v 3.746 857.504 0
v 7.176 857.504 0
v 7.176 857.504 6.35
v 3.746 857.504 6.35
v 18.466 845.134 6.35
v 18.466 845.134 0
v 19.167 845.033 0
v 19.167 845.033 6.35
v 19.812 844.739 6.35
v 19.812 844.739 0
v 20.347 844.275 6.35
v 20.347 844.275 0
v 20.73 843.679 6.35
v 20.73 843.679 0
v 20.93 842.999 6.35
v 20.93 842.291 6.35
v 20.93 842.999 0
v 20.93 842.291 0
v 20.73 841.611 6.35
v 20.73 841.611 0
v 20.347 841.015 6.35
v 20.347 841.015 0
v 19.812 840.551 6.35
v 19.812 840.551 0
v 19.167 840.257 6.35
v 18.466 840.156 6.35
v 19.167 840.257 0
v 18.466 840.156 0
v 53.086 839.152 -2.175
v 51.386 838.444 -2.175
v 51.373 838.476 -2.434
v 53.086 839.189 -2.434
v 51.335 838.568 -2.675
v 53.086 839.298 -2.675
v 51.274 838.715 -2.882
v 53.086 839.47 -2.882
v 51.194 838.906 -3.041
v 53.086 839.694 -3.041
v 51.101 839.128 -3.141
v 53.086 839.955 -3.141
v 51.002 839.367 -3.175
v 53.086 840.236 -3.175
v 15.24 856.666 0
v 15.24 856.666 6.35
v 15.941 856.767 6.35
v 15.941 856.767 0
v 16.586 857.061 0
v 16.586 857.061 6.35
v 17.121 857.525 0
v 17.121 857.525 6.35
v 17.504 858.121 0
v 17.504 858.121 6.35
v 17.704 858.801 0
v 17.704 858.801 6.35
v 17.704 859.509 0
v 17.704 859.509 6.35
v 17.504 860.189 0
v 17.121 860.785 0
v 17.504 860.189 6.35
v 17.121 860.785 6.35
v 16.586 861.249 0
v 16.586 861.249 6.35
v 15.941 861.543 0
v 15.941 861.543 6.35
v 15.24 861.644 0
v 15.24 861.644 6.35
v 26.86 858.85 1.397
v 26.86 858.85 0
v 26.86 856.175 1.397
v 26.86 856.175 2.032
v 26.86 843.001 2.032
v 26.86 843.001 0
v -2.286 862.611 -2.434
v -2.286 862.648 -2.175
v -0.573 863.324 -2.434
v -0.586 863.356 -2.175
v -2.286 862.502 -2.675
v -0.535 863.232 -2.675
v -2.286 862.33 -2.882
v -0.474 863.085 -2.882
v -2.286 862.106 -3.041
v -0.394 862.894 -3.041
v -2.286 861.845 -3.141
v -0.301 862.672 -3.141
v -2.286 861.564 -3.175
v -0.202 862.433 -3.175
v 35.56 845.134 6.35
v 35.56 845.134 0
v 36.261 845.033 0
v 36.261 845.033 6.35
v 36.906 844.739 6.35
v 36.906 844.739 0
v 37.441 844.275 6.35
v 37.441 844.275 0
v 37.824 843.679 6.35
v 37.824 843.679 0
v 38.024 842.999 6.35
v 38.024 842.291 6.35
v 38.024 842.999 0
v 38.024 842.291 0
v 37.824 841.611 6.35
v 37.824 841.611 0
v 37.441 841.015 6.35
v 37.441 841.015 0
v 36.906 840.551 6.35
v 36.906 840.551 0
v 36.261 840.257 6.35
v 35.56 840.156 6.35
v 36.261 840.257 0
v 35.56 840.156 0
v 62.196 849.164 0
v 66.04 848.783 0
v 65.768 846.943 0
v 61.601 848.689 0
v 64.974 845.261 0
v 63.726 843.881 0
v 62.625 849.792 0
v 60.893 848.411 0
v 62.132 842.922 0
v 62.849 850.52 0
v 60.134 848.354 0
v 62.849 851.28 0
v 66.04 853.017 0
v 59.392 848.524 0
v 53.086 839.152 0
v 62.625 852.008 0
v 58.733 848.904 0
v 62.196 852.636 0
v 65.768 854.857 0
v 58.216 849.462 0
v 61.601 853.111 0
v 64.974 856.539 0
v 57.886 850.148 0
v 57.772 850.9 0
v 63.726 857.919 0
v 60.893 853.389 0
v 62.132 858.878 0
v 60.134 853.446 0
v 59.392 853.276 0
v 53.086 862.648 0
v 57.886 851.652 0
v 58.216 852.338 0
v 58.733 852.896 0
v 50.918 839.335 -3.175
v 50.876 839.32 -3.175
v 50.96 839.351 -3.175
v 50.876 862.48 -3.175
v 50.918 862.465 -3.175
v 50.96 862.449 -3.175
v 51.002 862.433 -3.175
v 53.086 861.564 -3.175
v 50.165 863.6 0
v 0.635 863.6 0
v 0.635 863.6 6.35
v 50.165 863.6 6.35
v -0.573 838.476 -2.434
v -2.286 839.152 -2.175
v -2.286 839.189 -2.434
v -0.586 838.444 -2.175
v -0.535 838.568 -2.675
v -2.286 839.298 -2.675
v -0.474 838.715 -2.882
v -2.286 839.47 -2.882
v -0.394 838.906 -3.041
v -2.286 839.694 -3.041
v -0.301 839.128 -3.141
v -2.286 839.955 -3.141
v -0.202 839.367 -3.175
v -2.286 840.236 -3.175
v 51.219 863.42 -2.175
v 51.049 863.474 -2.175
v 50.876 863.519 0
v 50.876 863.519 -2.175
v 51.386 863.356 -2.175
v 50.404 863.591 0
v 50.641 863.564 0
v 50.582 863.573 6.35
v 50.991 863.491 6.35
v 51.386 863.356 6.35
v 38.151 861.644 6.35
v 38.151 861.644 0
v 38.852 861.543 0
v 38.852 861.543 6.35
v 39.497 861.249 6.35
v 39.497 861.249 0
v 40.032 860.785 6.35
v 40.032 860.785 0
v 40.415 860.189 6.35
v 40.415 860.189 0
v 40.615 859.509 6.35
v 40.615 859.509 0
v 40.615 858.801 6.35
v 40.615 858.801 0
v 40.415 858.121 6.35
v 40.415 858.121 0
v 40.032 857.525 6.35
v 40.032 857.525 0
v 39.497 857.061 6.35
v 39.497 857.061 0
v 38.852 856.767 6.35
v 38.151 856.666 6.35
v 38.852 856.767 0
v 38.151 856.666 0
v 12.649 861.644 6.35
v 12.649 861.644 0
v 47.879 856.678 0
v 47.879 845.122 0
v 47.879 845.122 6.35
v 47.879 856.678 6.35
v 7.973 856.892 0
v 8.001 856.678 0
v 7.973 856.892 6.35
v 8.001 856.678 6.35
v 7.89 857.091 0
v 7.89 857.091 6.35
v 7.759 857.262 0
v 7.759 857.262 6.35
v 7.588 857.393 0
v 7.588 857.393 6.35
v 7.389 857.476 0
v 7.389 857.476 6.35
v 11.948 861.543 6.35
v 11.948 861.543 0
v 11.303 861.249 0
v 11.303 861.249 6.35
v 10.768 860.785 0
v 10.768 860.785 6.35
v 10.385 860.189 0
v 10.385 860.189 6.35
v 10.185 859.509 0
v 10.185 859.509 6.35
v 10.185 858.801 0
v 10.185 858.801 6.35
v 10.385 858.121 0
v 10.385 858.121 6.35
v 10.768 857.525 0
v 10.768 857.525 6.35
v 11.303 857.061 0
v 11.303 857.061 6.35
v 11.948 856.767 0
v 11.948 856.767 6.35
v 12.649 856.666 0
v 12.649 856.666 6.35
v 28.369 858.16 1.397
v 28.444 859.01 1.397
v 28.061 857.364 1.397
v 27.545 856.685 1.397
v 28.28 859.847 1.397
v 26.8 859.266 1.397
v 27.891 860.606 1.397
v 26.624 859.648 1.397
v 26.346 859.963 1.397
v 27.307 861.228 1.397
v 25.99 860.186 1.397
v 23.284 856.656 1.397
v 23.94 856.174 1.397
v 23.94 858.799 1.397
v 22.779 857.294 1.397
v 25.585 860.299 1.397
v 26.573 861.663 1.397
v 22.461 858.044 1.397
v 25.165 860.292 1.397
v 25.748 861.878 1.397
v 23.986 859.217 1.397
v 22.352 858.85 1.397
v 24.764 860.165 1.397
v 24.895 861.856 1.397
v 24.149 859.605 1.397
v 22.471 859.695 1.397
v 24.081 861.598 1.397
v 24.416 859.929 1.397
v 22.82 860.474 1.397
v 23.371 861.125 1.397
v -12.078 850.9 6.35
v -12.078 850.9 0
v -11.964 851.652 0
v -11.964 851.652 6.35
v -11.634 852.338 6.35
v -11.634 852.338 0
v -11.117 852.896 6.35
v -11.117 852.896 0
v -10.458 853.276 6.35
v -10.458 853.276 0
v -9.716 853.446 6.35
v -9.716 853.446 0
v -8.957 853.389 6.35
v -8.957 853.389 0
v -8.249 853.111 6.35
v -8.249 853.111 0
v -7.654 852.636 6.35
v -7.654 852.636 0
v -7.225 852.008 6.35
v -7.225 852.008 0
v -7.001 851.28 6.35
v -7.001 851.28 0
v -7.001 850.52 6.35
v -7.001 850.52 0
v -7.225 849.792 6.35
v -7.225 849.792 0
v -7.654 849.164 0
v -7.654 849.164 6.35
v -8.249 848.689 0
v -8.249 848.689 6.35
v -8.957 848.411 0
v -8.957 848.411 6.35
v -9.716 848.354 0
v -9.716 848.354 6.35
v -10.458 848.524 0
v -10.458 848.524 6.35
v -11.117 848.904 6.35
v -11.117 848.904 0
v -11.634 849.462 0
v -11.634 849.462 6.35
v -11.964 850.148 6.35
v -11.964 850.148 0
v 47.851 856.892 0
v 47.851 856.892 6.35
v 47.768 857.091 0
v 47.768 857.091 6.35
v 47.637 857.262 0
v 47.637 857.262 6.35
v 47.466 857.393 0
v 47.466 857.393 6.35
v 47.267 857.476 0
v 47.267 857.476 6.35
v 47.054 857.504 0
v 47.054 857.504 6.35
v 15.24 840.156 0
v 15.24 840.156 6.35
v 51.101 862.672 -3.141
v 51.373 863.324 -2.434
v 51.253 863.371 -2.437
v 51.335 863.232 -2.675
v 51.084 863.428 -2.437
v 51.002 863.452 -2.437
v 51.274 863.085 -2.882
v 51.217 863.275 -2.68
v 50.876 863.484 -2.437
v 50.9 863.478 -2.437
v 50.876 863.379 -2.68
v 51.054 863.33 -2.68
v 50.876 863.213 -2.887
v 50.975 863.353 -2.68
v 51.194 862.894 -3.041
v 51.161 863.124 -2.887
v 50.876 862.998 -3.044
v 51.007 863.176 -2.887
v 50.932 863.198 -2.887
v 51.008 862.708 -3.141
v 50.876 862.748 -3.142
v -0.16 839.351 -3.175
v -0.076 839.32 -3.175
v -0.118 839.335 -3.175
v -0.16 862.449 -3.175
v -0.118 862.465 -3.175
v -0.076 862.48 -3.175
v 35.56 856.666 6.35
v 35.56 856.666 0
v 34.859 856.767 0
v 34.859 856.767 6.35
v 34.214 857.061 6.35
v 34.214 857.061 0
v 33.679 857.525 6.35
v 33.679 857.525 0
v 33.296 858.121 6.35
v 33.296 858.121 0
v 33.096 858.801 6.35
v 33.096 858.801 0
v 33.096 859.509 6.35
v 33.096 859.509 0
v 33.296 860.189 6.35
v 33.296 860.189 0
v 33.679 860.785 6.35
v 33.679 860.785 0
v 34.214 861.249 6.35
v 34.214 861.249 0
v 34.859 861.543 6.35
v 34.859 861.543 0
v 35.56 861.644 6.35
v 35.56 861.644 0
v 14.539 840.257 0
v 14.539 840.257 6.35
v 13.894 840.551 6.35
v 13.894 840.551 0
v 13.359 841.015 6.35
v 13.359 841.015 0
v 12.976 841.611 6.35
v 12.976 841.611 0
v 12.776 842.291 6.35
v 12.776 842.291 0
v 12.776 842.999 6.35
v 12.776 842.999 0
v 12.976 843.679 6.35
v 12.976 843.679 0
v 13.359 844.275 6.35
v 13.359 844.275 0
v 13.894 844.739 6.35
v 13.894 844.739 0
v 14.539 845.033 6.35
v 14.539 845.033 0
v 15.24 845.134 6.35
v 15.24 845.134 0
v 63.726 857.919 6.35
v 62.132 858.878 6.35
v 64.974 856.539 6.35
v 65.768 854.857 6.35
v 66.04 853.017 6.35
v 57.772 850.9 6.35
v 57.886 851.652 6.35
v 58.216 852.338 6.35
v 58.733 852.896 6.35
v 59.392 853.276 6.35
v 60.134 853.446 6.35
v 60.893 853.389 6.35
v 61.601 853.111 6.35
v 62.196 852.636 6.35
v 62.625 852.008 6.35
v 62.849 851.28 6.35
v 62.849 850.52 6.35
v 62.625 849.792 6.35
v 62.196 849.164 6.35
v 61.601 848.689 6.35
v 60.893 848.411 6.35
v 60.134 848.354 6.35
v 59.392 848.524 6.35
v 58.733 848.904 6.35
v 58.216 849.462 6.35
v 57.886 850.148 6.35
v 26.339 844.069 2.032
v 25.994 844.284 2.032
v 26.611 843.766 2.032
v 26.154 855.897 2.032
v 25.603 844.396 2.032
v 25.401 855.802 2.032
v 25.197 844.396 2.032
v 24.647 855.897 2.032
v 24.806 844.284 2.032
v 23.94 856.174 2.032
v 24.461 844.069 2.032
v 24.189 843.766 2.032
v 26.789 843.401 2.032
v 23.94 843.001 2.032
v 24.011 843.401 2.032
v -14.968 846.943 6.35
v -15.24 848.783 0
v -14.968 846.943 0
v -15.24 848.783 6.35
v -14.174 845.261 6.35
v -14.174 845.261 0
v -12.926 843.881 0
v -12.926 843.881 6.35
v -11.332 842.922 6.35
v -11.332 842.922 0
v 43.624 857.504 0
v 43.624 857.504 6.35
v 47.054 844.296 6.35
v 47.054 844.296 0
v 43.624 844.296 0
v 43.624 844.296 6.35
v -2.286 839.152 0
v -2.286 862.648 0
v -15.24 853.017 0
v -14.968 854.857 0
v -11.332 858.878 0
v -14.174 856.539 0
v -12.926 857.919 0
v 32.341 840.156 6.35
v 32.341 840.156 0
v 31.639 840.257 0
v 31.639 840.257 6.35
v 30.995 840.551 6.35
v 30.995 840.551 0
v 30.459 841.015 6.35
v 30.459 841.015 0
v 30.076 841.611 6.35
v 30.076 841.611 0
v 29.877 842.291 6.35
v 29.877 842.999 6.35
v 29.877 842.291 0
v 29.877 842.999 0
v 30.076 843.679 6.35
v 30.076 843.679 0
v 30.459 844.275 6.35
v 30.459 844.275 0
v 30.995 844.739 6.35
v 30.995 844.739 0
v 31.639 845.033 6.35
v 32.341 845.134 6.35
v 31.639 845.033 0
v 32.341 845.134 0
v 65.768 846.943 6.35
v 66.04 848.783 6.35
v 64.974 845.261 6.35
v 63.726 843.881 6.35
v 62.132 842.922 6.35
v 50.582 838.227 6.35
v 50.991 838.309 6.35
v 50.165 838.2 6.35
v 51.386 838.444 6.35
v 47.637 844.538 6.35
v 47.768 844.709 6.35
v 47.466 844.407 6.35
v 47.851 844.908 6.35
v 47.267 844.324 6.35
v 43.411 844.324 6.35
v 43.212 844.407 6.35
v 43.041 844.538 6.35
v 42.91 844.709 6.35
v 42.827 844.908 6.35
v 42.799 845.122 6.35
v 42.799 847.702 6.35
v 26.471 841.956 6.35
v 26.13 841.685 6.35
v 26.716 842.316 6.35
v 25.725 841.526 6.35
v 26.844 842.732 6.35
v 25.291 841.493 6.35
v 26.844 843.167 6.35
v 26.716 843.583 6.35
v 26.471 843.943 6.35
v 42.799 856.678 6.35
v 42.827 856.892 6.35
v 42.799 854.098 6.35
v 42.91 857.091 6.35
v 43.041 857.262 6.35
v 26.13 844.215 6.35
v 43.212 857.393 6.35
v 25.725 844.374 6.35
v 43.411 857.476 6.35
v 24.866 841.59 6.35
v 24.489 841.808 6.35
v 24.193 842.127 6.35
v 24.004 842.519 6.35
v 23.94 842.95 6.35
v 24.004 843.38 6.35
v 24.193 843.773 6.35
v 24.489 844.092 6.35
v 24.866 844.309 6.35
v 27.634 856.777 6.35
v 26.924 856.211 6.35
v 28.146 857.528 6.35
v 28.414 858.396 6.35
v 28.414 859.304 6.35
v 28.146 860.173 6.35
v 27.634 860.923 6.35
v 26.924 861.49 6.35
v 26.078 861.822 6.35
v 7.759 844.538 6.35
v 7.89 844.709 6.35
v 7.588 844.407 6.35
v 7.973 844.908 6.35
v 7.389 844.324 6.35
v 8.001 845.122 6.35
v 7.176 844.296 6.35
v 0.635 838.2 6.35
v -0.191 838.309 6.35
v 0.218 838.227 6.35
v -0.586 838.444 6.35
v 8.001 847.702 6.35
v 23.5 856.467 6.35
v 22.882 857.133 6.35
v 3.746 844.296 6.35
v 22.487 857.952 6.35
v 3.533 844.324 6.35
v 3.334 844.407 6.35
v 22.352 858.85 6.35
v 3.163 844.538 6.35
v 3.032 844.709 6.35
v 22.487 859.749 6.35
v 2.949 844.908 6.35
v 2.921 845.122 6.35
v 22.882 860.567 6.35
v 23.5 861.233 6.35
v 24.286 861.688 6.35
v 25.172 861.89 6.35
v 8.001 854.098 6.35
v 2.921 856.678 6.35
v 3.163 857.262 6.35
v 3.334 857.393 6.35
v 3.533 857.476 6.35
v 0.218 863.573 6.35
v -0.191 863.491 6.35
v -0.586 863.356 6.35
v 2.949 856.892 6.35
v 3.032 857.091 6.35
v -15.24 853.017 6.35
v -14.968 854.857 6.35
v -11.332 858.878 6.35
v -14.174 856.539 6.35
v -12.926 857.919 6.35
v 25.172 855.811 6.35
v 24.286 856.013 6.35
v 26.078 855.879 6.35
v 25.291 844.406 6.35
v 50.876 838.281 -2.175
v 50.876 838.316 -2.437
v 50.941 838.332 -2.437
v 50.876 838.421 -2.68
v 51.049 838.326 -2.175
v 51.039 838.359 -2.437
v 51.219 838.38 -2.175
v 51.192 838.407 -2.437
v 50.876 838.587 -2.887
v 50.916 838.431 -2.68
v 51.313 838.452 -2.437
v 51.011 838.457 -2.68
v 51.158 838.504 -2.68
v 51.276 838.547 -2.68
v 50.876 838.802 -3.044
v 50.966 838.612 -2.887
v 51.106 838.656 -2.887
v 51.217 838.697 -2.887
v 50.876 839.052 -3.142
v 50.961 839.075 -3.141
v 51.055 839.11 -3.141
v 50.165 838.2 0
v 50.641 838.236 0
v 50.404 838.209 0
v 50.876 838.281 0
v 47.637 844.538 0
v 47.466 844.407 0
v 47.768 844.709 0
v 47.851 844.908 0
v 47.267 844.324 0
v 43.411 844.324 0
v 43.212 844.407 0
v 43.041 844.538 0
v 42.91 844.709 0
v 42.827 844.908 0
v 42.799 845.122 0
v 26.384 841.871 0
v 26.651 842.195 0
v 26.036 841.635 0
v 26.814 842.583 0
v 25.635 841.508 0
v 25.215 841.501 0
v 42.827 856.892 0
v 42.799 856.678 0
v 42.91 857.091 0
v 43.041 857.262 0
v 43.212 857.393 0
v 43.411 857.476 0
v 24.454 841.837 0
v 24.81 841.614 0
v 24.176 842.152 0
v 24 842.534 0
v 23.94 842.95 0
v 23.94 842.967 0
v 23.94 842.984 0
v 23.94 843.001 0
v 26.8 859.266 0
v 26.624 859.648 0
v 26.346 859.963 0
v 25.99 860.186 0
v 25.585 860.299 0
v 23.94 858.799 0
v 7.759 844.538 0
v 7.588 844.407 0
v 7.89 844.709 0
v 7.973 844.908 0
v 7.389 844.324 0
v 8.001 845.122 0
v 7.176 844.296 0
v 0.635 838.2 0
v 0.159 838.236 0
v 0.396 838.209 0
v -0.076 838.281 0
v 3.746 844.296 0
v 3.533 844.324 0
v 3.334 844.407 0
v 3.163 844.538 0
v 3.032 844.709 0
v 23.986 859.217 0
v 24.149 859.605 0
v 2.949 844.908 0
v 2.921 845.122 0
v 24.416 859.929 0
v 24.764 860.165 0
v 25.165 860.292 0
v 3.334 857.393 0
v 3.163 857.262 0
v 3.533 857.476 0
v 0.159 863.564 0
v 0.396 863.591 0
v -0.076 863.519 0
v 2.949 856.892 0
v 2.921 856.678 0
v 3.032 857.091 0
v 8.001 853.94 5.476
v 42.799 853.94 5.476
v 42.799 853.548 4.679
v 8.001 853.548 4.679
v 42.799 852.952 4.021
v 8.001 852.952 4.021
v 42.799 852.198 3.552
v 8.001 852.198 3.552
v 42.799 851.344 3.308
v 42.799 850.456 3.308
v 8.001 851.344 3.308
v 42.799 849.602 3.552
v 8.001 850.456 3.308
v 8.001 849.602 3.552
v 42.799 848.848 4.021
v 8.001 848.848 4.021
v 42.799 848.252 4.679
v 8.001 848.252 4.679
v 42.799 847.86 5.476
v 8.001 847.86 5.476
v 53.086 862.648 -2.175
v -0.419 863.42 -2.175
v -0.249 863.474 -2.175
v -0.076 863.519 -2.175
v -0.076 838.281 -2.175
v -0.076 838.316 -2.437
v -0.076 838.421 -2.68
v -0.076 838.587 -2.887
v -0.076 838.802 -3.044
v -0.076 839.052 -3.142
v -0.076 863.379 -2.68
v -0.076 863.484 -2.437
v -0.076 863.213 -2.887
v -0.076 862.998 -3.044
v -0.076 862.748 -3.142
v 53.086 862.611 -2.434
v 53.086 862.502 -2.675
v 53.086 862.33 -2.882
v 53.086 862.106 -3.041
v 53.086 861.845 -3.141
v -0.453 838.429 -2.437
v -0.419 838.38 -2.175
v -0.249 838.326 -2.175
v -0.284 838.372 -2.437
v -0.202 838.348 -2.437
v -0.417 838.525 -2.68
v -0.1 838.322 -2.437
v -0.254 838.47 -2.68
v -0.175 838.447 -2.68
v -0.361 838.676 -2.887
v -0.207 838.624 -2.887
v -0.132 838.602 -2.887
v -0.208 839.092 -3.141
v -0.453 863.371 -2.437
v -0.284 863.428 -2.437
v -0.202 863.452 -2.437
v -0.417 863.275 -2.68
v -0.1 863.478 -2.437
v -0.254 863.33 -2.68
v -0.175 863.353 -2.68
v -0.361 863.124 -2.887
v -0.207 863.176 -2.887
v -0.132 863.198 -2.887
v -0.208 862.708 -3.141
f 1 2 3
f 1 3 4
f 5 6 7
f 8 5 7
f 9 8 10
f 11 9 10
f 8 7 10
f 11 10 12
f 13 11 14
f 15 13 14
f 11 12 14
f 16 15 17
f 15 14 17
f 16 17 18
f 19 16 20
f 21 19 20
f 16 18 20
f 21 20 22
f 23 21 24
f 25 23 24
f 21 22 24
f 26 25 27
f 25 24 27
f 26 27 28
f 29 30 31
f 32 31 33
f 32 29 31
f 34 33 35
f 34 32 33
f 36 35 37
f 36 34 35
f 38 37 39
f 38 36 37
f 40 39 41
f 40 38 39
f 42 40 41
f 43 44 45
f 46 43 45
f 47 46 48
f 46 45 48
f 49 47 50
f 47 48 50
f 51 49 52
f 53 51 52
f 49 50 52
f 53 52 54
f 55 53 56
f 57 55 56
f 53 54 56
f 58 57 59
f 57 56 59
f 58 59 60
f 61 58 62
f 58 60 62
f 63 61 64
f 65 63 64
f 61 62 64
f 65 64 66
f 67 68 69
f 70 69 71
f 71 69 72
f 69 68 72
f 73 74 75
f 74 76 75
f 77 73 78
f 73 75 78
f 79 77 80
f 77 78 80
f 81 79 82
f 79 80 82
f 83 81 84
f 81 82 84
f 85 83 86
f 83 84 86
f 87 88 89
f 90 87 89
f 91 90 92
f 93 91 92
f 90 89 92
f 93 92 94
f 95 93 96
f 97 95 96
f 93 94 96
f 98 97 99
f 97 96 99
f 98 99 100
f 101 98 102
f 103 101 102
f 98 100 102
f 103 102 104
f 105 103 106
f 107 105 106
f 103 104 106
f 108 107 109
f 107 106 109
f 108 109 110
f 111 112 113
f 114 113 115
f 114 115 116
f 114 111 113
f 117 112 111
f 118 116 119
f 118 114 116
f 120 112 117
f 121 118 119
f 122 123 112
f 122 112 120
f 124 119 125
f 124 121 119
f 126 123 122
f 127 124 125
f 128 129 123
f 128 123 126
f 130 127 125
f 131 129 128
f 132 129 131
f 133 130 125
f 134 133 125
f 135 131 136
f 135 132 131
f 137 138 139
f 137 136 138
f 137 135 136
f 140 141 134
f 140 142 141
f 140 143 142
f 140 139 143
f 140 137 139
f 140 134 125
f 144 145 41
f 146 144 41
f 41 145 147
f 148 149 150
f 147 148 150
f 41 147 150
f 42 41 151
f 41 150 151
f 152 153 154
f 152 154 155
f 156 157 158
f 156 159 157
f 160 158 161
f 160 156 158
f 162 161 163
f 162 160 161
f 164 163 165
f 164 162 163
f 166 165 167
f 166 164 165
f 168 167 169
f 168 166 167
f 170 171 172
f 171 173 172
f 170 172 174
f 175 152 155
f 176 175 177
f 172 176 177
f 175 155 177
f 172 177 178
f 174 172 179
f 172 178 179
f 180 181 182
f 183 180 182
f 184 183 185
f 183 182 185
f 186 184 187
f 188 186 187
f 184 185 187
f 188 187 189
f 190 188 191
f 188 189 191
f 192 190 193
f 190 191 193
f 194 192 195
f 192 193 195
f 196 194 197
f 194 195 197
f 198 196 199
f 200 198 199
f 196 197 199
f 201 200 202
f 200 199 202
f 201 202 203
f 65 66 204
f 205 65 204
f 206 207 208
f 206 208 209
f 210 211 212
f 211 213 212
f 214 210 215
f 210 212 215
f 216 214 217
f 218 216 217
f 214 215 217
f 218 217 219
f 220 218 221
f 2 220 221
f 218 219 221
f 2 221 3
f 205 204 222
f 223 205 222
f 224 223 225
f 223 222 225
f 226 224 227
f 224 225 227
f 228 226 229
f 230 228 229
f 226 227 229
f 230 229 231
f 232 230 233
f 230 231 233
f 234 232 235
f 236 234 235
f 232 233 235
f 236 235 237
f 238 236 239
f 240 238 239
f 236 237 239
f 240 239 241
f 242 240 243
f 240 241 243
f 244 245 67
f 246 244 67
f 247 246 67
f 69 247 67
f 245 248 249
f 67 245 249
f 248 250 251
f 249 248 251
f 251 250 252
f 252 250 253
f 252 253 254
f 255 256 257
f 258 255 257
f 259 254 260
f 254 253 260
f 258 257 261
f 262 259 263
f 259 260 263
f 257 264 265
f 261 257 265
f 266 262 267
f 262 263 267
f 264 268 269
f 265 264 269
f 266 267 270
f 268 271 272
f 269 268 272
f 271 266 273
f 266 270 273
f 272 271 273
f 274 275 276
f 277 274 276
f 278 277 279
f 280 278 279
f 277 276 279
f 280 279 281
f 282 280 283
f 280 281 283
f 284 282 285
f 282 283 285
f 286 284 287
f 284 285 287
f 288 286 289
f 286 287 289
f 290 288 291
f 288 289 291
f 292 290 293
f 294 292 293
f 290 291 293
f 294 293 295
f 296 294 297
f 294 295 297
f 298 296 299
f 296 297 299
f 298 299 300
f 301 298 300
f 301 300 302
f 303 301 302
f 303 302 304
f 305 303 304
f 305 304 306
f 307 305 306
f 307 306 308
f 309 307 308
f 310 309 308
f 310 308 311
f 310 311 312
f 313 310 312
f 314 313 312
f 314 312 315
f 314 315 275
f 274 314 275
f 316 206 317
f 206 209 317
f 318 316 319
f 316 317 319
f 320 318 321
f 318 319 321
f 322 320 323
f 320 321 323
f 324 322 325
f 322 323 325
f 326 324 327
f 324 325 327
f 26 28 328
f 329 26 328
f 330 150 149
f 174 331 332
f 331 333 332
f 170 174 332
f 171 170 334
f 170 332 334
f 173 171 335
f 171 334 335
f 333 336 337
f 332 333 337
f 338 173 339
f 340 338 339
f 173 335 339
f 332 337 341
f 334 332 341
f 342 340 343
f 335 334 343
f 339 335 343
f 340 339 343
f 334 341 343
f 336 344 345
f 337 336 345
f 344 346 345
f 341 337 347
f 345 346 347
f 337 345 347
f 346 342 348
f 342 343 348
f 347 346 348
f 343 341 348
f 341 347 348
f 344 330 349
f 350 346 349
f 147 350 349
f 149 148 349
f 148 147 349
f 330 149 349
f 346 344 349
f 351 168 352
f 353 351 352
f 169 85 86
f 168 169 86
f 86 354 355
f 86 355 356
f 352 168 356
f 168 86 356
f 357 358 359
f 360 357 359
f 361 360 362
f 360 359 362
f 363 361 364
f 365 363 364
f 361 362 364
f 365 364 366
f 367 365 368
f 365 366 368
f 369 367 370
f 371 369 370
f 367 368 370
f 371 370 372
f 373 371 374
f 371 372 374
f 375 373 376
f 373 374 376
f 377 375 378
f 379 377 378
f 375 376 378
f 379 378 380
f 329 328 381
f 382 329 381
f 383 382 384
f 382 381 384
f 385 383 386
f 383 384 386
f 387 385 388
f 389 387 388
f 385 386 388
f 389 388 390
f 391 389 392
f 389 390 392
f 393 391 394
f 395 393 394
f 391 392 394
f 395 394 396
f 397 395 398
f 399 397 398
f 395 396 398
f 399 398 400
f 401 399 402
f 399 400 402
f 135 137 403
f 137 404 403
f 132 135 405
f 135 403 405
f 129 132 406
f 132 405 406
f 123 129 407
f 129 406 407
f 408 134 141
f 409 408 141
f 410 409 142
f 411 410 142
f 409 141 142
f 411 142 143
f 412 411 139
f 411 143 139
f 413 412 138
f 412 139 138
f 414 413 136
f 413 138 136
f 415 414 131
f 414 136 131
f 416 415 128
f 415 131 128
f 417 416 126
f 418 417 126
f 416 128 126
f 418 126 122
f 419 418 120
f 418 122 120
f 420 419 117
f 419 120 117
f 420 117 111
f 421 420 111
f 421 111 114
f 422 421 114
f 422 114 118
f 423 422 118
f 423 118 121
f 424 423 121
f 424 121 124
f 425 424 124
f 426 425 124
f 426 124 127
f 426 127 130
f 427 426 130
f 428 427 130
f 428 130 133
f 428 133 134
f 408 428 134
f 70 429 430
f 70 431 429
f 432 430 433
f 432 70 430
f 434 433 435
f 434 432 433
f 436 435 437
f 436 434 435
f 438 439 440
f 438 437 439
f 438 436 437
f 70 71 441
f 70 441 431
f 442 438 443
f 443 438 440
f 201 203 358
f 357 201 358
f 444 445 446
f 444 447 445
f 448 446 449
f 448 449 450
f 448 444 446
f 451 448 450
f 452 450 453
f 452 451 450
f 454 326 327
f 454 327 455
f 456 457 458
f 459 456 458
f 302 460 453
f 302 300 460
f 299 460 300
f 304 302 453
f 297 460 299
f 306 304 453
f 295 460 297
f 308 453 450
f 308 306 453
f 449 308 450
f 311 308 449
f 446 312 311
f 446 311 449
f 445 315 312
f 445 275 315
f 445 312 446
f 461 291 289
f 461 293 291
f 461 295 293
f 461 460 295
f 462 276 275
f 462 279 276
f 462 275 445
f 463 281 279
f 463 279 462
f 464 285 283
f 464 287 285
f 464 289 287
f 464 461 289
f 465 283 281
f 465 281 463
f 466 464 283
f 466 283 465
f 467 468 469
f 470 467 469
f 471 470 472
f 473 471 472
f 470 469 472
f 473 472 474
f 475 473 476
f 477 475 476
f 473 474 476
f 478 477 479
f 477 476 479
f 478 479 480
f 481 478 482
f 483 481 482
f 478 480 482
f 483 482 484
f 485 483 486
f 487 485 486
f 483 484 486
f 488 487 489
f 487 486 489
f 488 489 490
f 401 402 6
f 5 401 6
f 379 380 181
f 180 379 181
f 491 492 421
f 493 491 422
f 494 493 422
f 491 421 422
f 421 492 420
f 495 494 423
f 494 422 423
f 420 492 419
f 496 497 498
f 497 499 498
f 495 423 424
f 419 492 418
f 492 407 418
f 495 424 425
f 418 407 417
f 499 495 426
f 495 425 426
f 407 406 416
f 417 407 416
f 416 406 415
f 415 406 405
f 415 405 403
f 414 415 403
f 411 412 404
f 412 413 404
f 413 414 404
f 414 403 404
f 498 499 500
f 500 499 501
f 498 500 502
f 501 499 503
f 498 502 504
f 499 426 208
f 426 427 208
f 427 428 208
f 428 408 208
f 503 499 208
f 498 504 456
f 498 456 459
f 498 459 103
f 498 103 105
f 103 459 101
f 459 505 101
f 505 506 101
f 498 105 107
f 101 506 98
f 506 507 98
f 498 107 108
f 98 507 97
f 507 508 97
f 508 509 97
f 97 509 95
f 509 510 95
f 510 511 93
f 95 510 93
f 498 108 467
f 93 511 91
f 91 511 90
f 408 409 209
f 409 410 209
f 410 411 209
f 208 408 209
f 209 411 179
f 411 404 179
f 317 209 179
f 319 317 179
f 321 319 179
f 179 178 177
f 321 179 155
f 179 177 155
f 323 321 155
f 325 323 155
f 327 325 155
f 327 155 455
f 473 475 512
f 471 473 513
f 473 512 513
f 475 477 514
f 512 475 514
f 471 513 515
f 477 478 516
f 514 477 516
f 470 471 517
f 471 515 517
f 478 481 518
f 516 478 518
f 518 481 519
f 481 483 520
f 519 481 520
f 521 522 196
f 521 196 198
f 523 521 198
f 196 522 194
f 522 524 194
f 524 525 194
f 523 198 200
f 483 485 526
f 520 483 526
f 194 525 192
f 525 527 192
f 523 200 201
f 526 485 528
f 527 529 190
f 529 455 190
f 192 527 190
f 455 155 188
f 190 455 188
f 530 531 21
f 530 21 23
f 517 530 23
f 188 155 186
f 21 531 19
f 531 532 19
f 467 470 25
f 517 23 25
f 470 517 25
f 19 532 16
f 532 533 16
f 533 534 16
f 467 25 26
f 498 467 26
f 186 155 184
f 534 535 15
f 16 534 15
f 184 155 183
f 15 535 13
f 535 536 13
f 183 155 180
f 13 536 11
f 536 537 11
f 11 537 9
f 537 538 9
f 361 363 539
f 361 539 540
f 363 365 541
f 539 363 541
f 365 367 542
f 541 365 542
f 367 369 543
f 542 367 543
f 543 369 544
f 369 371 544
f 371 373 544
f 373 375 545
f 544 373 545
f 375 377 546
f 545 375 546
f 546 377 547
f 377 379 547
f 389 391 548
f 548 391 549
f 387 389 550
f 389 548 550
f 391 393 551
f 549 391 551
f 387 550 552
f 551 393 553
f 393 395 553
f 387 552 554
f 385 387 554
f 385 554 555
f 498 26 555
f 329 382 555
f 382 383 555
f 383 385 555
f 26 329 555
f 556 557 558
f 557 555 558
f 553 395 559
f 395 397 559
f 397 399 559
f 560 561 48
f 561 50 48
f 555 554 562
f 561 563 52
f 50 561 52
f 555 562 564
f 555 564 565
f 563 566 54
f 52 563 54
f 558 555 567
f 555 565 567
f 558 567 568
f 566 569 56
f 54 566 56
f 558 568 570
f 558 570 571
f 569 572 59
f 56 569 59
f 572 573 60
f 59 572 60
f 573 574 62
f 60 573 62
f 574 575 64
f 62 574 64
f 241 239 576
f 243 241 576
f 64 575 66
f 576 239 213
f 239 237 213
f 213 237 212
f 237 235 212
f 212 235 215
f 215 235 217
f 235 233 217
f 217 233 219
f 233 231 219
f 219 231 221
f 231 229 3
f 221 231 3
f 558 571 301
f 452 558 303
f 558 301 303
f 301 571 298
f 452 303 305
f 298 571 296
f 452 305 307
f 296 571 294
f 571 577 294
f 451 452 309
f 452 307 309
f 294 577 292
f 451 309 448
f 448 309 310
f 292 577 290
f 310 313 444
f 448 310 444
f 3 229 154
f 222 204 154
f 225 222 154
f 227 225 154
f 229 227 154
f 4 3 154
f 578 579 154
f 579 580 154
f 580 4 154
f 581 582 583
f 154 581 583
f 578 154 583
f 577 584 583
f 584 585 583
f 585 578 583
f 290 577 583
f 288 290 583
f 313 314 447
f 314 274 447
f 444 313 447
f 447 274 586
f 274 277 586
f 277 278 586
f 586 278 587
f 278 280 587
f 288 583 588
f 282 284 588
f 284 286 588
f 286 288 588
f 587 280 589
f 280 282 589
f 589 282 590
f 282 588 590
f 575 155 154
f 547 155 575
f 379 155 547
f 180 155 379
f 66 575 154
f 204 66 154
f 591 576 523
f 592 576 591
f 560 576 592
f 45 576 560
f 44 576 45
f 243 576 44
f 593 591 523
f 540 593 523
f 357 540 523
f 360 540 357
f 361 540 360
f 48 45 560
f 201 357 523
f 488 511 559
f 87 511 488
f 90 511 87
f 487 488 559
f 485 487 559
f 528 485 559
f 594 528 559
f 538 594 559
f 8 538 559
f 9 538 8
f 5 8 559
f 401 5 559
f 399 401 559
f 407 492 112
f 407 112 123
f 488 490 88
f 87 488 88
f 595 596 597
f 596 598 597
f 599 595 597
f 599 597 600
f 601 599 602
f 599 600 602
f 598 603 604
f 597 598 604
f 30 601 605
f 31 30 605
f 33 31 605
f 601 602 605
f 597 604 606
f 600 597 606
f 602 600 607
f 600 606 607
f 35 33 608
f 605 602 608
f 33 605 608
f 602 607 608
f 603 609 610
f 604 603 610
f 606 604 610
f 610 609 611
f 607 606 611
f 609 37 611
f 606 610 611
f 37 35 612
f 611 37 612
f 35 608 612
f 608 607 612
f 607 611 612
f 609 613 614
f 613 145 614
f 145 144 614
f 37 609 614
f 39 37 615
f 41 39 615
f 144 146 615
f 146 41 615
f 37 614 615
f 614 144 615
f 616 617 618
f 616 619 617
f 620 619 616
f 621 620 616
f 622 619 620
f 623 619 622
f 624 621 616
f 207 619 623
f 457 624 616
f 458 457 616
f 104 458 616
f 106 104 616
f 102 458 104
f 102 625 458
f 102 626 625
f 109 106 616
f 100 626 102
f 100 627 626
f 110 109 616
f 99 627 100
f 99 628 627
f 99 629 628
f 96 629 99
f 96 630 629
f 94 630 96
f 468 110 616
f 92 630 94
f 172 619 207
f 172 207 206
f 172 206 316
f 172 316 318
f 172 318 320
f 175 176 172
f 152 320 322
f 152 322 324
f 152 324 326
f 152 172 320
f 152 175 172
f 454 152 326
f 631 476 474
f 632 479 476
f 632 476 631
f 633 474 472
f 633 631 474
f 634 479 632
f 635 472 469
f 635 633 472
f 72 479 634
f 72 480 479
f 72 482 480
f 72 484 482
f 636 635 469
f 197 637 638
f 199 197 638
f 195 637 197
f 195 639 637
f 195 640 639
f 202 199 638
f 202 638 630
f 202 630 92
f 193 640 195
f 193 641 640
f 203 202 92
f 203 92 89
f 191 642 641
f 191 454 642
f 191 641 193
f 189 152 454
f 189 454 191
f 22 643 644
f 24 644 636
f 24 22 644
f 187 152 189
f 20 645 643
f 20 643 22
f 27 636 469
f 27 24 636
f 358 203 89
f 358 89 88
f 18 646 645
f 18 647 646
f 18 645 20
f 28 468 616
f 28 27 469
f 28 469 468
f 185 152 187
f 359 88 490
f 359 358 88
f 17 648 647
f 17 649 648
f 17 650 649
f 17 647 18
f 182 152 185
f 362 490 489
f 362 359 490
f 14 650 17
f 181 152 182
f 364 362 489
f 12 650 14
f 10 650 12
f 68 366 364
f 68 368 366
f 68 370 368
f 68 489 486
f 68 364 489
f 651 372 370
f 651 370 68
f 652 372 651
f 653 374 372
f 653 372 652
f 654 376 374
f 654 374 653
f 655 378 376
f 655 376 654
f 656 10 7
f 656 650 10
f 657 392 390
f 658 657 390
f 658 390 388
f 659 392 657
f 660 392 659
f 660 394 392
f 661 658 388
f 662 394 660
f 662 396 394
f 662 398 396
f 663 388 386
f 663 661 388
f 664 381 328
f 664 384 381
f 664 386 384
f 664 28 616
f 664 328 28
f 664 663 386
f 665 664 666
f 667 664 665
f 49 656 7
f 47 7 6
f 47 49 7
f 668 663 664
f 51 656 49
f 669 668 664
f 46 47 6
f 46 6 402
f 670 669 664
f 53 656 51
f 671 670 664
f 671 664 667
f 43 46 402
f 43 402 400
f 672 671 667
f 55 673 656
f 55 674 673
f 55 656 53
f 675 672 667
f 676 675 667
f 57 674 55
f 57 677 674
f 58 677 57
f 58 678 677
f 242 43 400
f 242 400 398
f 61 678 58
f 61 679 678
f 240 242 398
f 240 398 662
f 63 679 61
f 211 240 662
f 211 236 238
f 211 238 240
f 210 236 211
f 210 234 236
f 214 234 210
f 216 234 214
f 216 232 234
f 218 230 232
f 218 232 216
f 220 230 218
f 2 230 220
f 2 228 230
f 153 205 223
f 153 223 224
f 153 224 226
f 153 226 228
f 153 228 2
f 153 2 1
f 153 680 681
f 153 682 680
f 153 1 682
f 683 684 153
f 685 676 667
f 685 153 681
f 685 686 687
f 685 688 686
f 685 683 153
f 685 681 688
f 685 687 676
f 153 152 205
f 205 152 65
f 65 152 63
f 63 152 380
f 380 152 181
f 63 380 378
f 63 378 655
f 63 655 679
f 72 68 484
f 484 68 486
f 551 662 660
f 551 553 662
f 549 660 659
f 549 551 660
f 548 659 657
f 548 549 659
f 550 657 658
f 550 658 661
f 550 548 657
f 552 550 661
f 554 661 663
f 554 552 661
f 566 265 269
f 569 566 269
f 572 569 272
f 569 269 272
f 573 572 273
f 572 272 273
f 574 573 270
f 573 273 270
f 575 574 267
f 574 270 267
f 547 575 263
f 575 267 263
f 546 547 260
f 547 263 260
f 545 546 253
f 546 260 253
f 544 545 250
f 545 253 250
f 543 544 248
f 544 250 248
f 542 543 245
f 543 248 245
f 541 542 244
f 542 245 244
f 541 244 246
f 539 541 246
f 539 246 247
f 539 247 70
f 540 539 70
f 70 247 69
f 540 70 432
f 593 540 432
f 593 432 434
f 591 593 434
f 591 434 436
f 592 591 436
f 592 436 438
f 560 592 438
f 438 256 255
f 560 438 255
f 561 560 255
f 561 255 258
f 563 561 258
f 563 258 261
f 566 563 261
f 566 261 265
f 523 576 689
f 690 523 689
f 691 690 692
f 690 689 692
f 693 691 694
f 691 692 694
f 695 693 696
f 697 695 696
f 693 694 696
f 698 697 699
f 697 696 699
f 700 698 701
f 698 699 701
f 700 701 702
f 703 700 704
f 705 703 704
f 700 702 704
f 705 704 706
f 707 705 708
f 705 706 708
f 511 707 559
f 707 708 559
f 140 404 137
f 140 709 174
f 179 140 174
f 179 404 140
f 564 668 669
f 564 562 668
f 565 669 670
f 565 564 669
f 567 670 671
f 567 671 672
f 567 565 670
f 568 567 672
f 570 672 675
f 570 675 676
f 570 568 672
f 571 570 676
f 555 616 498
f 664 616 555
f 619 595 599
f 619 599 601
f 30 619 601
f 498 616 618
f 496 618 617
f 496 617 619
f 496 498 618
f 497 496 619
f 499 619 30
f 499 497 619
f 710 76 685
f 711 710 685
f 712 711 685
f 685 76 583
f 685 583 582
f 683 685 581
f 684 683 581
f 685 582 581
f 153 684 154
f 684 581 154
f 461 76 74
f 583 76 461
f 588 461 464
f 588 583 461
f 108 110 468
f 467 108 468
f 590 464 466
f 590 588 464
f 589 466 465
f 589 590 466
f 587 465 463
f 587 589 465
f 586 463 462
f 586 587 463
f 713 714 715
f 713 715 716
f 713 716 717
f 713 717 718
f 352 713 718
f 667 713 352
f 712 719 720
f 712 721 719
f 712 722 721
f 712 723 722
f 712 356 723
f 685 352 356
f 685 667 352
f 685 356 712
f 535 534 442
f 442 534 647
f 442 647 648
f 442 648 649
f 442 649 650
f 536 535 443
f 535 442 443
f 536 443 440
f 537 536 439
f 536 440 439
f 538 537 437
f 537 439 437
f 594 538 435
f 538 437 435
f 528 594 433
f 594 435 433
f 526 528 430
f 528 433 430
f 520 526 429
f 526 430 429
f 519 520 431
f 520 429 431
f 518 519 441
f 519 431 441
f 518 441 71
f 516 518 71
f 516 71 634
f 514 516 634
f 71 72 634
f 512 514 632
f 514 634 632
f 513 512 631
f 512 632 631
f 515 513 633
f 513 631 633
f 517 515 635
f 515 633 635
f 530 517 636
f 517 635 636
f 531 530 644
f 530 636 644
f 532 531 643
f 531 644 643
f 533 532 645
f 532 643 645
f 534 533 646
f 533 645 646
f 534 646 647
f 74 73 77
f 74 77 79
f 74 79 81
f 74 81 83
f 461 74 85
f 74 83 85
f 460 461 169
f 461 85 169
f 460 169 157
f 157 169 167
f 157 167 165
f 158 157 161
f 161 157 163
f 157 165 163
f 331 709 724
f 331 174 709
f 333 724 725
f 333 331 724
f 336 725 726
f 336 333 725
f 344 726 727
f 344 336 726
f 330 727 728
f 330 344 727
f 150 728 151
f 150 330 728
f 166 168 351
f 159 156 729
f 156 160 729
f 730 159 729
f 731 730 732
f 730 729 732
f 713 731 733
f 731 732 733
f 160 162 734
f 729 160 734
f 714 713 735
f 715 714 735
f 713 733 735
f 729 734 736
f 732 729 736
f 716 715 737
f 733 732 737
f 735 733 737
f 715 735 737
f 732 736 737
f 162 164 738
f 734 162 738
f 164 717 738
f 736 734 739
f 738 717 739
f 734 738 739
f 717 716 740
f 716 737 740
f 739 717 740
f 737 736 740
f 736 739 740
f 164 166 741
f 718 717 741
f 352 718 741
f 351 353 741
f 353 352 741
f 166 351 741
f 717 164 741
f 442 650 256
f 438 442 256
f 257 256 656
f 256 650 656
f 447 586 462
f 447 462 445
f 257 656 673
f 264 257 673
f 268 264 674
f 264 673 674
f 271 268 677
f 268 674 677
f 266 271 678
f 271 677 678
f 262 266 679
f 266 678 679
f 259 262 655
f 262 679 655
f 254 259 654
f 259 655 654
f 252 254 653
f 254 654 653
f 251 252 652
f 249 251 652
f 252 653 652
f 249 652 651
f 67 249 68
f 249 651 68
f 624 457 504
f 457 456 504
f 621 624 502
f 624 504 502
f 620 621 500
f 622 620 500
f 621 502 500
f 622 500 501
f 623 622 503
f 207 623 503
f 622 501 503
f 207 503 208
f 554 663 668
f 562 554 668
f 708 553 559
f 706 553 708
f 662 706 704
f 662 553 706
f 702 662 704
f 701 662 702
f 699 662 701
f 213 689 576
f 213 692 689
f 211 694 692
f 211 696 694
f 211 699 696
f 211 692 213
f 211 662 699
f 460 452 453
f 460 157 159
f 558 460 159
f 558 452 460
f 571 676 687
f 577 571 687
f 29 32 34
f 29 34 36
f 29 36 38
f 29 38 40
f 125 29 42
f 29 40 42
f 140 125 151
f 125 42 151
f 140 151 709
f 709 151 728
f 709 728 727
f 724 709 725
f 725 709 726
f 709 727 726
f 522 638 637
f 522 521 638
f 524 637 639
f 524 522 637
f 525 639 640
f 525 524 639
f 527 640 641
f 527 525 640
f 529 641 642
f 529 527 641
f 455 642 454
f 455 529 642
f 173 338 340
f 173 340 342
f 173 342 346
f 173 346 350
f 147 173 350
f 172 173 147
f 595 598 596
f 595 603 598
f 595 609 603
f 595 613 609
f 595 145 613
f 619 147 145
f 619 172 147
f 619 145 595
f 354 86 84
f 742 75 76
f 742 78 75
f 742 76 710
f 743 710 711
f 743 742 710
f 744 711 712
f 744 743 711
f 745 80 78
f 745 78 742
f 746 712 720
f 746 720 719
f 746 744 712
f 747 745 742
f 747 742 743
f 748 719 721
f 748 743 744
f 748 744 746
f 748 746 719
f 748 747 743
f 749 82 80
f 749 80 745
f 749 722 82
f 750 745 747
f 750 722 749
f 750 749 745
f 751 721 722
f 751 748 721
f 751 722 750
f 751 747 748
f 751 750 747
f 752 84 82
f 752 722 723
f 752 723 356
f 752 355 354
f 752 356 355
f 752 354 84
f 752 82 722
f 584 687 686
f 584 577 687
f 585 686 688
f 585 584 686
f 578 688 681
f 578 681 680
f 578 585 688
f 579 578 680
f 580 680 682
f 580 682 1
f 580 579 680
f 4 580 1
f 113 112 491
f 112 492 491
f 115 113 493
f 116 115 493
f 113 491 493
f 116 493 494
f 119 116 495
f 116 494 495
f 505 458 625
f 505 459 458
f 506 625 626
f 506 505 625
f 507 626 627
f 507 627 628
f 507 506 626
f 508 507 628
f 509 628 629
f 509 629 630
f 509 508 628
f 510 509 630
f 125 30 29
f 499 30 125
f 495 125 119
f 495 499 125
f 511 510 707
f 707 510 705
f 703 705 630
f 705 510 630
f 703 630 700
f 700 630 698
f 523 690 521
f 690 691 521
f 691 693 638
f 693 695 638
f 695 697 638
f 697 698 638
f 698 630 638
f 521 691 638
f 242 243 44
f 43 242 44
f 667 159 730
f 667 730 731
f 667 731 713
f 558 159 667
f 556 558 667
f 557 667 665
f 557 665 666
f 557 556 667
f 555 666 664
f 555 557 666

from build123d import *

# Parameters (mm, degrees)
BOSS_EXTRUDE1_DEPTH            = 6.35
BOSS_EXTRUDE2_DEPTH            = 3.175
BOSS_EXTRUDE3_DEPTH            = 3.175
CUT_EXTRUDE1_DEPTH             = 3.175
SKETCH5_W                      = 5.08
SKETCH5_H                      = 13.208
CUT_EXTRUDE2_DEPTH             = 7.35
SKETCH6_W                      = 5.08
SKETCH6_H                      = 13.208
CUT_EXTRUDE3_DEPTH             = 7.35
CUT_EXTRUDE4_REACH             = 60.039
CUT_EXTRUDE5_DEPTH             = 3.175
CUT_EXTRUDE6_DEPTH             = 7.35
CUT_EXTRUDE7_DEPTH             = 7.35
CUT_EXTRUDE8_DEPTH             = 7.35
CUT_EXTRUDE9_DEPTH             = 10.525
CUT_EXTRUDE10_DEPTH            = 2.032
F_12_CLEARANCE_HOLE1_D         = 6.096
F_12_CLEARANCE_HOLE1_DEPTH     = 4.953
F_3_CLEARANCE_HOLE1_D          = 2.921
F_3_CLEARANCE_HOLE1_DEPTH      = 9.525
F_7_0_201_DIAMETER_HOLE1_D     = 5.1054
F_7_0_201_DIAMETER_HOLE1_DEPTH = 9.525
FILLET1_R                      = 3.175
FILLET2_R                      = 0.8255
FILLET3_R                      = 1
FILLET4_R                      = 6.35


with BuildPart() as part:
    # Sketch1 → Boss-Extrude1 (new body)
    with BuildSketch(Plane(origin=(0, 0, 0), x_dir=(-1, 0, 0), z_dir=(0, 0, -1))):
        Polygon((-50.8, 863.6), (-66.04, 857.25), (-66.04, 844.55), (-50.8, 838.2), (0, 838.2), (15.24, 844.55), (15.24, 857.25), (0, 863.6), align=None)
    extrude(amount=-BOSS_EXTRUDE1_DEPTH)

    # Sketch2 → Boss-Extrude2 (add)
    with BuildSketch(Plane(origin=(0, 0, 0), x_dir=(-1, 0, 0), z_dir=(0, 0, -1))):
        Polygon((-50.8762, 838.23175), (-66.04, 844.55), (-66.04, 857.25), (-50.8762, 863.56825), align=None)
    extrude(amount=BOSS_EXTRUDE2_DEPTH)

    # Sketch3 → Boss-Extrude3 (add)
    with BuildSketch(Plane(origin=(0, 0, 0), x_dir=(-1, 0, 0), z_dir=(0, 0, -1))):
        Polygon((0.0762, 863.56825), (15.24, 857.25), (15.24, 844.55), (0.0762, 838.23175), align=None)
    extrude(amount=BOSS_EXTRUDE3_DEPTH)

    # Sketch4 → Cut-Extrude1 (cut)
    with BuildSketch(Plane(origin=(0, 0, -3.175), x_dir=(-1, 0, 0), z_dir=(0, 0, -1))):
        Polygon((2.286, 862.6475), (2.286, 839.1525), (15.24, 844.55), (15.24, 857.25), align=None)
    extrude(amount=-CUT_EXTRUDE1_DEPTH, mode=Mode.SUBTRACT)

    # Sketch5 → Cut-Extrude2 (cut, through all)
    with BuildSketch(Plane(origin=(0, 0, 0), x_dir=(-1, 0, 0), z_dir=(0, 0, -1))):
        with Locations((-5.461, 850.9)):
            Rectangle(SKETCH5_W, SKETCH5_H)
    extrude(amount=-CUT_EXTRUDE2_DEPTH, mode=Mode.SUBTRACT)

    # Sketch6 → Cut-Extrude3 (cut, through all)
    with BuildSketch(Plane(origin=(0, 0, 0), x_dir=(-1, 0, 0), z_dir=(0, 0, -1))):
        with Locations((-45.339, 850.9)):
            Rectangle(SKETCH6_W, SKETCH6_H)
    extrude(amount=-CUT_EXTRUDE3_DEPTH, mode=Mode.SUBTRACT)

    # Sketch7 → Cut-Extrude4 (cut, up to next)
    with BuildSketch(Plane.ZY.offset(-8.001), mode=Mode.PRIVATE) as cut_extrude4_sk1:
        with BuildLine():
            Line((6.35, 847.702120834), (6.35, 854.097879166))
            ThreePointArc((6.35, 854.097879166), (3.2766, 850.9), (6.35, 847.702120834))
        make_face()
    cut_extrude4_tool1 = extrude(cut_extrude4_sk1.sketch, amount=-CUT_EXTRUDE4_REACH, mode=Mode.PRIVATE) & part.part
    add(cut_extrude4_tool1.solids().sort_by_distance((8.001, 850.9, 5.049826))[0], mode=Mode.SUBTRACT)

    # Sketch8 → Cut-Extrude5 (cut)
    with BuildSketch(Plane(origin=(0, 0, -3.175), x_dir=(-1, 0, 0), z_dir=(0, 0, -1))):
        Polygon((-53.086, 839.1525), (-53.086, 862.6475), (-66.04, 857.25), (-66.04, 844.55), align=None)
    extrude(amount=-CUT_EXTRUDE5_DEPTH, mode=Mode.SUBTRACT)

    # Sketch9 → Cut-Extrude6 (cut, through all)
    with BuildSketch(Plane(origin=(0, 0, 0), x_dir=(-1, 0, 0), z_dir=(0, 0, -1))):
        with BuildLine():
            Line((-35.56, 840.1558), (-32.340549132, 840.1558))
            ThreePointArc((-32.340549132, 840.1558), (-29.851349132, 842.645), (-32.340549132, 845.1342))
            Line((-32.340549132, 845.1342), (-35.56, 845.1342))
            ThreePointArc((-35.56, 845.1342), (-38.0492, 842.645), (-35.56, 840.1558))
        make_face()
    extrude(amount=-CUT_EXTRUDE6_DEPTH, mode=Mode.SUBTRACT)

    # Sketch10 → Cut-Extrude7 (cut, through all)
    with BuildSketch(Plane(origin=(0, 0, 0), x_dir=(-1, 0, 0), z_dir=(0, 0, -1))):
        with BuildLine():
            Line((-35.56, 861.6442), (-38.1508, 861.6442))
            ThreePointArc((-38.1508, 861.6442), (-40.64, 859.155), (-38.1508, 856.6658))
            Line((-38.1508, 856.6658), (-35.56, 856.6658))
            ThreePointArc((-35.56, 856.6658), (-33.0708, 859.155), (-35.56, 861.6442))
        make_face()
    extrude(amount=-CUT_EXTRUDE7_DEPTH, mode=Mode.SUBTRACT)

    # Sketch11 → Cut-Extrude8 (cut, through all)
    with BuildSketch(Plane(origin=(0, 0, 0), x_dir=(-1, 0, 0), z_dir=(0, 0, -1))):
        with BuildLine():
            Line((-15.24, 845.1342), (-18.4658, 845.1342))
            ThreePointArc((-18.4658, 845.1342), (-20.955, 842.645), (-18.4658, 840.1558))
            Line((-18.4658, 840.1558), (-15.24, 840.1558))
            ThreePointArc((-15.24, 840.1558), (-12.7508, 842.645), (-15.24, 845.1342))
        make_face()
    extrude(amount=-CUT_EXTRUDE8_DEPTH, mode=Mode.SUBTRACT)

    # Sketch12 → Cut-Extrude9 (cut, through all)
    with BuildSketch(Plane.XY.offset(6.35)):
        with BuildLine():
            Line((15.24, 861.6442), (12.6492, 861.6442))
            ThreePointArc((12.6492, 861.6442), (10.16, 859.155), (12.6492, 856.6658))
            Line((12.6492, 856.6658), (15.24, 856.6658))
            ThreePointArc((15.24, 856.6658), (17.7292, 859.155), (15.24, 861.6442))
        make_face()
    extrude(amount=-CUT_EXTRUDE9_DEPTH, mode=Mode.SUBTRACT)

    # Sketch13 → Cut-Extrude10 (cut)
    with BuildSketch(Plane(origin=(0, 0, 0), x_dir=(-1, 0, 0), z_dir=(0, 0, -1))):
        with BuildLine():
            Line((-26.8605, 843.0006), (-23.940383746, 843.0006))
            Line((-23.940383746, 843.0006), (-23.940383746, 858.7994))
            ThreePointArc((-23.940383746, 858.7994), (-25.374596157, 860.310479047), (-26.8605, 858.8502))
            Line((-26.8605, 858.8502), (-26.8605, 843.0006))
        make_face()
    extrude(amount=-CUT_EXTRUDE10_DEPTH, mode=Mode.SUBTRACT)

    # #12 Clearance Hole1
    with Locations(Plane.XY.offset(6.35)):
        with Locations((25.4, 858.8502)):
            Hole(F_12_CLEARANCE_HOLE1_D / 2, depth=F_12_CLEARANCE_HOLE1_DEPTH)

    # #3 Clearance Hole1
    with Locations(Plane.XY.offset(6.35)):
        with Locations((25.4, 842.9498)):
            Hole(F_3_CLEARANCE_HOLE1_D / 2, depth=F_3_CLEARANCE_HOLE1_DEPTH)

    # #7 (0.201) Diameter Hole1
    with Locations(Plane.XY.offset(6.35)):
        with Locations((-9.525, 850.9), (60.325, 850.9)):
            Hole(F_7_0_201_DIAMETER_HOLE1_D / 2, depth=F_7_0_201_DIAMETER_HOLE1_DEPTH)

    # Fillet1
    fillet1_edges = [part.edges().sort_by_distance(p)[0] for p in [
        (0, 838.2, 3.175),
        (50.8, 838.2, 3.175),
        (50.8, 863.6, 3.175),
        (0, 863.6, 3.175),
    ]]
    fillet(fillet1_edges, radius=FILLET1_R)

    # Fillet2
    fillet2_edges = [part.edges().sort_by_distance(p)[0] for p in [
        (8.001, 857.504, 3.175),
        (2.921, 857.504, 3.175),
        (2.921, 844.296, 3.175),
        (8.001, 844.296, 3.175),
        (47.879, 857.504, 3.175),
        (42.799, 857.504, 3.175),
        (42.799, 844.296, 3.175),
        (47.879, 844.296, 3.175),
    ]]
    fillet(fillet2_edges, radius=FILLET2_R)

    # Fillet3
    fillet3_edges = [part.edges().sort_by_distance(p)[0] for p in [
        (52.236076923, 838.798365385, -3.175),
        (-1.436076923, 838.798365385, -3.175),
        (-0.334631427, 863.448316043, -3.175),
        (-0.334631427, 838.351683957, -3.175),
        (52.236076923, 863.001634615, -3.175),
        (51.134631427, 863.448316043, -3.175),
        (51.134631427, 838.351683957, -3.175),
        (-1.436076923, 863.001634615, -3.175),
    ]]
    fillet(fillet3_edges, radius=FILLET3_R)

    # Fillet4
    fillet4_edges = [part.edges().sort_by_distance(p)[0] for p in [
        (-15.24, 857.25, 3.175),
        (-15.24, 844.55, 3.175),
        (66.04, 844.55, 3.175),
        (66.04, 857.25, 3.175),
    ]]
    fillet(fillet4_edges, radius=FILLET4_R)


solid = part.part
